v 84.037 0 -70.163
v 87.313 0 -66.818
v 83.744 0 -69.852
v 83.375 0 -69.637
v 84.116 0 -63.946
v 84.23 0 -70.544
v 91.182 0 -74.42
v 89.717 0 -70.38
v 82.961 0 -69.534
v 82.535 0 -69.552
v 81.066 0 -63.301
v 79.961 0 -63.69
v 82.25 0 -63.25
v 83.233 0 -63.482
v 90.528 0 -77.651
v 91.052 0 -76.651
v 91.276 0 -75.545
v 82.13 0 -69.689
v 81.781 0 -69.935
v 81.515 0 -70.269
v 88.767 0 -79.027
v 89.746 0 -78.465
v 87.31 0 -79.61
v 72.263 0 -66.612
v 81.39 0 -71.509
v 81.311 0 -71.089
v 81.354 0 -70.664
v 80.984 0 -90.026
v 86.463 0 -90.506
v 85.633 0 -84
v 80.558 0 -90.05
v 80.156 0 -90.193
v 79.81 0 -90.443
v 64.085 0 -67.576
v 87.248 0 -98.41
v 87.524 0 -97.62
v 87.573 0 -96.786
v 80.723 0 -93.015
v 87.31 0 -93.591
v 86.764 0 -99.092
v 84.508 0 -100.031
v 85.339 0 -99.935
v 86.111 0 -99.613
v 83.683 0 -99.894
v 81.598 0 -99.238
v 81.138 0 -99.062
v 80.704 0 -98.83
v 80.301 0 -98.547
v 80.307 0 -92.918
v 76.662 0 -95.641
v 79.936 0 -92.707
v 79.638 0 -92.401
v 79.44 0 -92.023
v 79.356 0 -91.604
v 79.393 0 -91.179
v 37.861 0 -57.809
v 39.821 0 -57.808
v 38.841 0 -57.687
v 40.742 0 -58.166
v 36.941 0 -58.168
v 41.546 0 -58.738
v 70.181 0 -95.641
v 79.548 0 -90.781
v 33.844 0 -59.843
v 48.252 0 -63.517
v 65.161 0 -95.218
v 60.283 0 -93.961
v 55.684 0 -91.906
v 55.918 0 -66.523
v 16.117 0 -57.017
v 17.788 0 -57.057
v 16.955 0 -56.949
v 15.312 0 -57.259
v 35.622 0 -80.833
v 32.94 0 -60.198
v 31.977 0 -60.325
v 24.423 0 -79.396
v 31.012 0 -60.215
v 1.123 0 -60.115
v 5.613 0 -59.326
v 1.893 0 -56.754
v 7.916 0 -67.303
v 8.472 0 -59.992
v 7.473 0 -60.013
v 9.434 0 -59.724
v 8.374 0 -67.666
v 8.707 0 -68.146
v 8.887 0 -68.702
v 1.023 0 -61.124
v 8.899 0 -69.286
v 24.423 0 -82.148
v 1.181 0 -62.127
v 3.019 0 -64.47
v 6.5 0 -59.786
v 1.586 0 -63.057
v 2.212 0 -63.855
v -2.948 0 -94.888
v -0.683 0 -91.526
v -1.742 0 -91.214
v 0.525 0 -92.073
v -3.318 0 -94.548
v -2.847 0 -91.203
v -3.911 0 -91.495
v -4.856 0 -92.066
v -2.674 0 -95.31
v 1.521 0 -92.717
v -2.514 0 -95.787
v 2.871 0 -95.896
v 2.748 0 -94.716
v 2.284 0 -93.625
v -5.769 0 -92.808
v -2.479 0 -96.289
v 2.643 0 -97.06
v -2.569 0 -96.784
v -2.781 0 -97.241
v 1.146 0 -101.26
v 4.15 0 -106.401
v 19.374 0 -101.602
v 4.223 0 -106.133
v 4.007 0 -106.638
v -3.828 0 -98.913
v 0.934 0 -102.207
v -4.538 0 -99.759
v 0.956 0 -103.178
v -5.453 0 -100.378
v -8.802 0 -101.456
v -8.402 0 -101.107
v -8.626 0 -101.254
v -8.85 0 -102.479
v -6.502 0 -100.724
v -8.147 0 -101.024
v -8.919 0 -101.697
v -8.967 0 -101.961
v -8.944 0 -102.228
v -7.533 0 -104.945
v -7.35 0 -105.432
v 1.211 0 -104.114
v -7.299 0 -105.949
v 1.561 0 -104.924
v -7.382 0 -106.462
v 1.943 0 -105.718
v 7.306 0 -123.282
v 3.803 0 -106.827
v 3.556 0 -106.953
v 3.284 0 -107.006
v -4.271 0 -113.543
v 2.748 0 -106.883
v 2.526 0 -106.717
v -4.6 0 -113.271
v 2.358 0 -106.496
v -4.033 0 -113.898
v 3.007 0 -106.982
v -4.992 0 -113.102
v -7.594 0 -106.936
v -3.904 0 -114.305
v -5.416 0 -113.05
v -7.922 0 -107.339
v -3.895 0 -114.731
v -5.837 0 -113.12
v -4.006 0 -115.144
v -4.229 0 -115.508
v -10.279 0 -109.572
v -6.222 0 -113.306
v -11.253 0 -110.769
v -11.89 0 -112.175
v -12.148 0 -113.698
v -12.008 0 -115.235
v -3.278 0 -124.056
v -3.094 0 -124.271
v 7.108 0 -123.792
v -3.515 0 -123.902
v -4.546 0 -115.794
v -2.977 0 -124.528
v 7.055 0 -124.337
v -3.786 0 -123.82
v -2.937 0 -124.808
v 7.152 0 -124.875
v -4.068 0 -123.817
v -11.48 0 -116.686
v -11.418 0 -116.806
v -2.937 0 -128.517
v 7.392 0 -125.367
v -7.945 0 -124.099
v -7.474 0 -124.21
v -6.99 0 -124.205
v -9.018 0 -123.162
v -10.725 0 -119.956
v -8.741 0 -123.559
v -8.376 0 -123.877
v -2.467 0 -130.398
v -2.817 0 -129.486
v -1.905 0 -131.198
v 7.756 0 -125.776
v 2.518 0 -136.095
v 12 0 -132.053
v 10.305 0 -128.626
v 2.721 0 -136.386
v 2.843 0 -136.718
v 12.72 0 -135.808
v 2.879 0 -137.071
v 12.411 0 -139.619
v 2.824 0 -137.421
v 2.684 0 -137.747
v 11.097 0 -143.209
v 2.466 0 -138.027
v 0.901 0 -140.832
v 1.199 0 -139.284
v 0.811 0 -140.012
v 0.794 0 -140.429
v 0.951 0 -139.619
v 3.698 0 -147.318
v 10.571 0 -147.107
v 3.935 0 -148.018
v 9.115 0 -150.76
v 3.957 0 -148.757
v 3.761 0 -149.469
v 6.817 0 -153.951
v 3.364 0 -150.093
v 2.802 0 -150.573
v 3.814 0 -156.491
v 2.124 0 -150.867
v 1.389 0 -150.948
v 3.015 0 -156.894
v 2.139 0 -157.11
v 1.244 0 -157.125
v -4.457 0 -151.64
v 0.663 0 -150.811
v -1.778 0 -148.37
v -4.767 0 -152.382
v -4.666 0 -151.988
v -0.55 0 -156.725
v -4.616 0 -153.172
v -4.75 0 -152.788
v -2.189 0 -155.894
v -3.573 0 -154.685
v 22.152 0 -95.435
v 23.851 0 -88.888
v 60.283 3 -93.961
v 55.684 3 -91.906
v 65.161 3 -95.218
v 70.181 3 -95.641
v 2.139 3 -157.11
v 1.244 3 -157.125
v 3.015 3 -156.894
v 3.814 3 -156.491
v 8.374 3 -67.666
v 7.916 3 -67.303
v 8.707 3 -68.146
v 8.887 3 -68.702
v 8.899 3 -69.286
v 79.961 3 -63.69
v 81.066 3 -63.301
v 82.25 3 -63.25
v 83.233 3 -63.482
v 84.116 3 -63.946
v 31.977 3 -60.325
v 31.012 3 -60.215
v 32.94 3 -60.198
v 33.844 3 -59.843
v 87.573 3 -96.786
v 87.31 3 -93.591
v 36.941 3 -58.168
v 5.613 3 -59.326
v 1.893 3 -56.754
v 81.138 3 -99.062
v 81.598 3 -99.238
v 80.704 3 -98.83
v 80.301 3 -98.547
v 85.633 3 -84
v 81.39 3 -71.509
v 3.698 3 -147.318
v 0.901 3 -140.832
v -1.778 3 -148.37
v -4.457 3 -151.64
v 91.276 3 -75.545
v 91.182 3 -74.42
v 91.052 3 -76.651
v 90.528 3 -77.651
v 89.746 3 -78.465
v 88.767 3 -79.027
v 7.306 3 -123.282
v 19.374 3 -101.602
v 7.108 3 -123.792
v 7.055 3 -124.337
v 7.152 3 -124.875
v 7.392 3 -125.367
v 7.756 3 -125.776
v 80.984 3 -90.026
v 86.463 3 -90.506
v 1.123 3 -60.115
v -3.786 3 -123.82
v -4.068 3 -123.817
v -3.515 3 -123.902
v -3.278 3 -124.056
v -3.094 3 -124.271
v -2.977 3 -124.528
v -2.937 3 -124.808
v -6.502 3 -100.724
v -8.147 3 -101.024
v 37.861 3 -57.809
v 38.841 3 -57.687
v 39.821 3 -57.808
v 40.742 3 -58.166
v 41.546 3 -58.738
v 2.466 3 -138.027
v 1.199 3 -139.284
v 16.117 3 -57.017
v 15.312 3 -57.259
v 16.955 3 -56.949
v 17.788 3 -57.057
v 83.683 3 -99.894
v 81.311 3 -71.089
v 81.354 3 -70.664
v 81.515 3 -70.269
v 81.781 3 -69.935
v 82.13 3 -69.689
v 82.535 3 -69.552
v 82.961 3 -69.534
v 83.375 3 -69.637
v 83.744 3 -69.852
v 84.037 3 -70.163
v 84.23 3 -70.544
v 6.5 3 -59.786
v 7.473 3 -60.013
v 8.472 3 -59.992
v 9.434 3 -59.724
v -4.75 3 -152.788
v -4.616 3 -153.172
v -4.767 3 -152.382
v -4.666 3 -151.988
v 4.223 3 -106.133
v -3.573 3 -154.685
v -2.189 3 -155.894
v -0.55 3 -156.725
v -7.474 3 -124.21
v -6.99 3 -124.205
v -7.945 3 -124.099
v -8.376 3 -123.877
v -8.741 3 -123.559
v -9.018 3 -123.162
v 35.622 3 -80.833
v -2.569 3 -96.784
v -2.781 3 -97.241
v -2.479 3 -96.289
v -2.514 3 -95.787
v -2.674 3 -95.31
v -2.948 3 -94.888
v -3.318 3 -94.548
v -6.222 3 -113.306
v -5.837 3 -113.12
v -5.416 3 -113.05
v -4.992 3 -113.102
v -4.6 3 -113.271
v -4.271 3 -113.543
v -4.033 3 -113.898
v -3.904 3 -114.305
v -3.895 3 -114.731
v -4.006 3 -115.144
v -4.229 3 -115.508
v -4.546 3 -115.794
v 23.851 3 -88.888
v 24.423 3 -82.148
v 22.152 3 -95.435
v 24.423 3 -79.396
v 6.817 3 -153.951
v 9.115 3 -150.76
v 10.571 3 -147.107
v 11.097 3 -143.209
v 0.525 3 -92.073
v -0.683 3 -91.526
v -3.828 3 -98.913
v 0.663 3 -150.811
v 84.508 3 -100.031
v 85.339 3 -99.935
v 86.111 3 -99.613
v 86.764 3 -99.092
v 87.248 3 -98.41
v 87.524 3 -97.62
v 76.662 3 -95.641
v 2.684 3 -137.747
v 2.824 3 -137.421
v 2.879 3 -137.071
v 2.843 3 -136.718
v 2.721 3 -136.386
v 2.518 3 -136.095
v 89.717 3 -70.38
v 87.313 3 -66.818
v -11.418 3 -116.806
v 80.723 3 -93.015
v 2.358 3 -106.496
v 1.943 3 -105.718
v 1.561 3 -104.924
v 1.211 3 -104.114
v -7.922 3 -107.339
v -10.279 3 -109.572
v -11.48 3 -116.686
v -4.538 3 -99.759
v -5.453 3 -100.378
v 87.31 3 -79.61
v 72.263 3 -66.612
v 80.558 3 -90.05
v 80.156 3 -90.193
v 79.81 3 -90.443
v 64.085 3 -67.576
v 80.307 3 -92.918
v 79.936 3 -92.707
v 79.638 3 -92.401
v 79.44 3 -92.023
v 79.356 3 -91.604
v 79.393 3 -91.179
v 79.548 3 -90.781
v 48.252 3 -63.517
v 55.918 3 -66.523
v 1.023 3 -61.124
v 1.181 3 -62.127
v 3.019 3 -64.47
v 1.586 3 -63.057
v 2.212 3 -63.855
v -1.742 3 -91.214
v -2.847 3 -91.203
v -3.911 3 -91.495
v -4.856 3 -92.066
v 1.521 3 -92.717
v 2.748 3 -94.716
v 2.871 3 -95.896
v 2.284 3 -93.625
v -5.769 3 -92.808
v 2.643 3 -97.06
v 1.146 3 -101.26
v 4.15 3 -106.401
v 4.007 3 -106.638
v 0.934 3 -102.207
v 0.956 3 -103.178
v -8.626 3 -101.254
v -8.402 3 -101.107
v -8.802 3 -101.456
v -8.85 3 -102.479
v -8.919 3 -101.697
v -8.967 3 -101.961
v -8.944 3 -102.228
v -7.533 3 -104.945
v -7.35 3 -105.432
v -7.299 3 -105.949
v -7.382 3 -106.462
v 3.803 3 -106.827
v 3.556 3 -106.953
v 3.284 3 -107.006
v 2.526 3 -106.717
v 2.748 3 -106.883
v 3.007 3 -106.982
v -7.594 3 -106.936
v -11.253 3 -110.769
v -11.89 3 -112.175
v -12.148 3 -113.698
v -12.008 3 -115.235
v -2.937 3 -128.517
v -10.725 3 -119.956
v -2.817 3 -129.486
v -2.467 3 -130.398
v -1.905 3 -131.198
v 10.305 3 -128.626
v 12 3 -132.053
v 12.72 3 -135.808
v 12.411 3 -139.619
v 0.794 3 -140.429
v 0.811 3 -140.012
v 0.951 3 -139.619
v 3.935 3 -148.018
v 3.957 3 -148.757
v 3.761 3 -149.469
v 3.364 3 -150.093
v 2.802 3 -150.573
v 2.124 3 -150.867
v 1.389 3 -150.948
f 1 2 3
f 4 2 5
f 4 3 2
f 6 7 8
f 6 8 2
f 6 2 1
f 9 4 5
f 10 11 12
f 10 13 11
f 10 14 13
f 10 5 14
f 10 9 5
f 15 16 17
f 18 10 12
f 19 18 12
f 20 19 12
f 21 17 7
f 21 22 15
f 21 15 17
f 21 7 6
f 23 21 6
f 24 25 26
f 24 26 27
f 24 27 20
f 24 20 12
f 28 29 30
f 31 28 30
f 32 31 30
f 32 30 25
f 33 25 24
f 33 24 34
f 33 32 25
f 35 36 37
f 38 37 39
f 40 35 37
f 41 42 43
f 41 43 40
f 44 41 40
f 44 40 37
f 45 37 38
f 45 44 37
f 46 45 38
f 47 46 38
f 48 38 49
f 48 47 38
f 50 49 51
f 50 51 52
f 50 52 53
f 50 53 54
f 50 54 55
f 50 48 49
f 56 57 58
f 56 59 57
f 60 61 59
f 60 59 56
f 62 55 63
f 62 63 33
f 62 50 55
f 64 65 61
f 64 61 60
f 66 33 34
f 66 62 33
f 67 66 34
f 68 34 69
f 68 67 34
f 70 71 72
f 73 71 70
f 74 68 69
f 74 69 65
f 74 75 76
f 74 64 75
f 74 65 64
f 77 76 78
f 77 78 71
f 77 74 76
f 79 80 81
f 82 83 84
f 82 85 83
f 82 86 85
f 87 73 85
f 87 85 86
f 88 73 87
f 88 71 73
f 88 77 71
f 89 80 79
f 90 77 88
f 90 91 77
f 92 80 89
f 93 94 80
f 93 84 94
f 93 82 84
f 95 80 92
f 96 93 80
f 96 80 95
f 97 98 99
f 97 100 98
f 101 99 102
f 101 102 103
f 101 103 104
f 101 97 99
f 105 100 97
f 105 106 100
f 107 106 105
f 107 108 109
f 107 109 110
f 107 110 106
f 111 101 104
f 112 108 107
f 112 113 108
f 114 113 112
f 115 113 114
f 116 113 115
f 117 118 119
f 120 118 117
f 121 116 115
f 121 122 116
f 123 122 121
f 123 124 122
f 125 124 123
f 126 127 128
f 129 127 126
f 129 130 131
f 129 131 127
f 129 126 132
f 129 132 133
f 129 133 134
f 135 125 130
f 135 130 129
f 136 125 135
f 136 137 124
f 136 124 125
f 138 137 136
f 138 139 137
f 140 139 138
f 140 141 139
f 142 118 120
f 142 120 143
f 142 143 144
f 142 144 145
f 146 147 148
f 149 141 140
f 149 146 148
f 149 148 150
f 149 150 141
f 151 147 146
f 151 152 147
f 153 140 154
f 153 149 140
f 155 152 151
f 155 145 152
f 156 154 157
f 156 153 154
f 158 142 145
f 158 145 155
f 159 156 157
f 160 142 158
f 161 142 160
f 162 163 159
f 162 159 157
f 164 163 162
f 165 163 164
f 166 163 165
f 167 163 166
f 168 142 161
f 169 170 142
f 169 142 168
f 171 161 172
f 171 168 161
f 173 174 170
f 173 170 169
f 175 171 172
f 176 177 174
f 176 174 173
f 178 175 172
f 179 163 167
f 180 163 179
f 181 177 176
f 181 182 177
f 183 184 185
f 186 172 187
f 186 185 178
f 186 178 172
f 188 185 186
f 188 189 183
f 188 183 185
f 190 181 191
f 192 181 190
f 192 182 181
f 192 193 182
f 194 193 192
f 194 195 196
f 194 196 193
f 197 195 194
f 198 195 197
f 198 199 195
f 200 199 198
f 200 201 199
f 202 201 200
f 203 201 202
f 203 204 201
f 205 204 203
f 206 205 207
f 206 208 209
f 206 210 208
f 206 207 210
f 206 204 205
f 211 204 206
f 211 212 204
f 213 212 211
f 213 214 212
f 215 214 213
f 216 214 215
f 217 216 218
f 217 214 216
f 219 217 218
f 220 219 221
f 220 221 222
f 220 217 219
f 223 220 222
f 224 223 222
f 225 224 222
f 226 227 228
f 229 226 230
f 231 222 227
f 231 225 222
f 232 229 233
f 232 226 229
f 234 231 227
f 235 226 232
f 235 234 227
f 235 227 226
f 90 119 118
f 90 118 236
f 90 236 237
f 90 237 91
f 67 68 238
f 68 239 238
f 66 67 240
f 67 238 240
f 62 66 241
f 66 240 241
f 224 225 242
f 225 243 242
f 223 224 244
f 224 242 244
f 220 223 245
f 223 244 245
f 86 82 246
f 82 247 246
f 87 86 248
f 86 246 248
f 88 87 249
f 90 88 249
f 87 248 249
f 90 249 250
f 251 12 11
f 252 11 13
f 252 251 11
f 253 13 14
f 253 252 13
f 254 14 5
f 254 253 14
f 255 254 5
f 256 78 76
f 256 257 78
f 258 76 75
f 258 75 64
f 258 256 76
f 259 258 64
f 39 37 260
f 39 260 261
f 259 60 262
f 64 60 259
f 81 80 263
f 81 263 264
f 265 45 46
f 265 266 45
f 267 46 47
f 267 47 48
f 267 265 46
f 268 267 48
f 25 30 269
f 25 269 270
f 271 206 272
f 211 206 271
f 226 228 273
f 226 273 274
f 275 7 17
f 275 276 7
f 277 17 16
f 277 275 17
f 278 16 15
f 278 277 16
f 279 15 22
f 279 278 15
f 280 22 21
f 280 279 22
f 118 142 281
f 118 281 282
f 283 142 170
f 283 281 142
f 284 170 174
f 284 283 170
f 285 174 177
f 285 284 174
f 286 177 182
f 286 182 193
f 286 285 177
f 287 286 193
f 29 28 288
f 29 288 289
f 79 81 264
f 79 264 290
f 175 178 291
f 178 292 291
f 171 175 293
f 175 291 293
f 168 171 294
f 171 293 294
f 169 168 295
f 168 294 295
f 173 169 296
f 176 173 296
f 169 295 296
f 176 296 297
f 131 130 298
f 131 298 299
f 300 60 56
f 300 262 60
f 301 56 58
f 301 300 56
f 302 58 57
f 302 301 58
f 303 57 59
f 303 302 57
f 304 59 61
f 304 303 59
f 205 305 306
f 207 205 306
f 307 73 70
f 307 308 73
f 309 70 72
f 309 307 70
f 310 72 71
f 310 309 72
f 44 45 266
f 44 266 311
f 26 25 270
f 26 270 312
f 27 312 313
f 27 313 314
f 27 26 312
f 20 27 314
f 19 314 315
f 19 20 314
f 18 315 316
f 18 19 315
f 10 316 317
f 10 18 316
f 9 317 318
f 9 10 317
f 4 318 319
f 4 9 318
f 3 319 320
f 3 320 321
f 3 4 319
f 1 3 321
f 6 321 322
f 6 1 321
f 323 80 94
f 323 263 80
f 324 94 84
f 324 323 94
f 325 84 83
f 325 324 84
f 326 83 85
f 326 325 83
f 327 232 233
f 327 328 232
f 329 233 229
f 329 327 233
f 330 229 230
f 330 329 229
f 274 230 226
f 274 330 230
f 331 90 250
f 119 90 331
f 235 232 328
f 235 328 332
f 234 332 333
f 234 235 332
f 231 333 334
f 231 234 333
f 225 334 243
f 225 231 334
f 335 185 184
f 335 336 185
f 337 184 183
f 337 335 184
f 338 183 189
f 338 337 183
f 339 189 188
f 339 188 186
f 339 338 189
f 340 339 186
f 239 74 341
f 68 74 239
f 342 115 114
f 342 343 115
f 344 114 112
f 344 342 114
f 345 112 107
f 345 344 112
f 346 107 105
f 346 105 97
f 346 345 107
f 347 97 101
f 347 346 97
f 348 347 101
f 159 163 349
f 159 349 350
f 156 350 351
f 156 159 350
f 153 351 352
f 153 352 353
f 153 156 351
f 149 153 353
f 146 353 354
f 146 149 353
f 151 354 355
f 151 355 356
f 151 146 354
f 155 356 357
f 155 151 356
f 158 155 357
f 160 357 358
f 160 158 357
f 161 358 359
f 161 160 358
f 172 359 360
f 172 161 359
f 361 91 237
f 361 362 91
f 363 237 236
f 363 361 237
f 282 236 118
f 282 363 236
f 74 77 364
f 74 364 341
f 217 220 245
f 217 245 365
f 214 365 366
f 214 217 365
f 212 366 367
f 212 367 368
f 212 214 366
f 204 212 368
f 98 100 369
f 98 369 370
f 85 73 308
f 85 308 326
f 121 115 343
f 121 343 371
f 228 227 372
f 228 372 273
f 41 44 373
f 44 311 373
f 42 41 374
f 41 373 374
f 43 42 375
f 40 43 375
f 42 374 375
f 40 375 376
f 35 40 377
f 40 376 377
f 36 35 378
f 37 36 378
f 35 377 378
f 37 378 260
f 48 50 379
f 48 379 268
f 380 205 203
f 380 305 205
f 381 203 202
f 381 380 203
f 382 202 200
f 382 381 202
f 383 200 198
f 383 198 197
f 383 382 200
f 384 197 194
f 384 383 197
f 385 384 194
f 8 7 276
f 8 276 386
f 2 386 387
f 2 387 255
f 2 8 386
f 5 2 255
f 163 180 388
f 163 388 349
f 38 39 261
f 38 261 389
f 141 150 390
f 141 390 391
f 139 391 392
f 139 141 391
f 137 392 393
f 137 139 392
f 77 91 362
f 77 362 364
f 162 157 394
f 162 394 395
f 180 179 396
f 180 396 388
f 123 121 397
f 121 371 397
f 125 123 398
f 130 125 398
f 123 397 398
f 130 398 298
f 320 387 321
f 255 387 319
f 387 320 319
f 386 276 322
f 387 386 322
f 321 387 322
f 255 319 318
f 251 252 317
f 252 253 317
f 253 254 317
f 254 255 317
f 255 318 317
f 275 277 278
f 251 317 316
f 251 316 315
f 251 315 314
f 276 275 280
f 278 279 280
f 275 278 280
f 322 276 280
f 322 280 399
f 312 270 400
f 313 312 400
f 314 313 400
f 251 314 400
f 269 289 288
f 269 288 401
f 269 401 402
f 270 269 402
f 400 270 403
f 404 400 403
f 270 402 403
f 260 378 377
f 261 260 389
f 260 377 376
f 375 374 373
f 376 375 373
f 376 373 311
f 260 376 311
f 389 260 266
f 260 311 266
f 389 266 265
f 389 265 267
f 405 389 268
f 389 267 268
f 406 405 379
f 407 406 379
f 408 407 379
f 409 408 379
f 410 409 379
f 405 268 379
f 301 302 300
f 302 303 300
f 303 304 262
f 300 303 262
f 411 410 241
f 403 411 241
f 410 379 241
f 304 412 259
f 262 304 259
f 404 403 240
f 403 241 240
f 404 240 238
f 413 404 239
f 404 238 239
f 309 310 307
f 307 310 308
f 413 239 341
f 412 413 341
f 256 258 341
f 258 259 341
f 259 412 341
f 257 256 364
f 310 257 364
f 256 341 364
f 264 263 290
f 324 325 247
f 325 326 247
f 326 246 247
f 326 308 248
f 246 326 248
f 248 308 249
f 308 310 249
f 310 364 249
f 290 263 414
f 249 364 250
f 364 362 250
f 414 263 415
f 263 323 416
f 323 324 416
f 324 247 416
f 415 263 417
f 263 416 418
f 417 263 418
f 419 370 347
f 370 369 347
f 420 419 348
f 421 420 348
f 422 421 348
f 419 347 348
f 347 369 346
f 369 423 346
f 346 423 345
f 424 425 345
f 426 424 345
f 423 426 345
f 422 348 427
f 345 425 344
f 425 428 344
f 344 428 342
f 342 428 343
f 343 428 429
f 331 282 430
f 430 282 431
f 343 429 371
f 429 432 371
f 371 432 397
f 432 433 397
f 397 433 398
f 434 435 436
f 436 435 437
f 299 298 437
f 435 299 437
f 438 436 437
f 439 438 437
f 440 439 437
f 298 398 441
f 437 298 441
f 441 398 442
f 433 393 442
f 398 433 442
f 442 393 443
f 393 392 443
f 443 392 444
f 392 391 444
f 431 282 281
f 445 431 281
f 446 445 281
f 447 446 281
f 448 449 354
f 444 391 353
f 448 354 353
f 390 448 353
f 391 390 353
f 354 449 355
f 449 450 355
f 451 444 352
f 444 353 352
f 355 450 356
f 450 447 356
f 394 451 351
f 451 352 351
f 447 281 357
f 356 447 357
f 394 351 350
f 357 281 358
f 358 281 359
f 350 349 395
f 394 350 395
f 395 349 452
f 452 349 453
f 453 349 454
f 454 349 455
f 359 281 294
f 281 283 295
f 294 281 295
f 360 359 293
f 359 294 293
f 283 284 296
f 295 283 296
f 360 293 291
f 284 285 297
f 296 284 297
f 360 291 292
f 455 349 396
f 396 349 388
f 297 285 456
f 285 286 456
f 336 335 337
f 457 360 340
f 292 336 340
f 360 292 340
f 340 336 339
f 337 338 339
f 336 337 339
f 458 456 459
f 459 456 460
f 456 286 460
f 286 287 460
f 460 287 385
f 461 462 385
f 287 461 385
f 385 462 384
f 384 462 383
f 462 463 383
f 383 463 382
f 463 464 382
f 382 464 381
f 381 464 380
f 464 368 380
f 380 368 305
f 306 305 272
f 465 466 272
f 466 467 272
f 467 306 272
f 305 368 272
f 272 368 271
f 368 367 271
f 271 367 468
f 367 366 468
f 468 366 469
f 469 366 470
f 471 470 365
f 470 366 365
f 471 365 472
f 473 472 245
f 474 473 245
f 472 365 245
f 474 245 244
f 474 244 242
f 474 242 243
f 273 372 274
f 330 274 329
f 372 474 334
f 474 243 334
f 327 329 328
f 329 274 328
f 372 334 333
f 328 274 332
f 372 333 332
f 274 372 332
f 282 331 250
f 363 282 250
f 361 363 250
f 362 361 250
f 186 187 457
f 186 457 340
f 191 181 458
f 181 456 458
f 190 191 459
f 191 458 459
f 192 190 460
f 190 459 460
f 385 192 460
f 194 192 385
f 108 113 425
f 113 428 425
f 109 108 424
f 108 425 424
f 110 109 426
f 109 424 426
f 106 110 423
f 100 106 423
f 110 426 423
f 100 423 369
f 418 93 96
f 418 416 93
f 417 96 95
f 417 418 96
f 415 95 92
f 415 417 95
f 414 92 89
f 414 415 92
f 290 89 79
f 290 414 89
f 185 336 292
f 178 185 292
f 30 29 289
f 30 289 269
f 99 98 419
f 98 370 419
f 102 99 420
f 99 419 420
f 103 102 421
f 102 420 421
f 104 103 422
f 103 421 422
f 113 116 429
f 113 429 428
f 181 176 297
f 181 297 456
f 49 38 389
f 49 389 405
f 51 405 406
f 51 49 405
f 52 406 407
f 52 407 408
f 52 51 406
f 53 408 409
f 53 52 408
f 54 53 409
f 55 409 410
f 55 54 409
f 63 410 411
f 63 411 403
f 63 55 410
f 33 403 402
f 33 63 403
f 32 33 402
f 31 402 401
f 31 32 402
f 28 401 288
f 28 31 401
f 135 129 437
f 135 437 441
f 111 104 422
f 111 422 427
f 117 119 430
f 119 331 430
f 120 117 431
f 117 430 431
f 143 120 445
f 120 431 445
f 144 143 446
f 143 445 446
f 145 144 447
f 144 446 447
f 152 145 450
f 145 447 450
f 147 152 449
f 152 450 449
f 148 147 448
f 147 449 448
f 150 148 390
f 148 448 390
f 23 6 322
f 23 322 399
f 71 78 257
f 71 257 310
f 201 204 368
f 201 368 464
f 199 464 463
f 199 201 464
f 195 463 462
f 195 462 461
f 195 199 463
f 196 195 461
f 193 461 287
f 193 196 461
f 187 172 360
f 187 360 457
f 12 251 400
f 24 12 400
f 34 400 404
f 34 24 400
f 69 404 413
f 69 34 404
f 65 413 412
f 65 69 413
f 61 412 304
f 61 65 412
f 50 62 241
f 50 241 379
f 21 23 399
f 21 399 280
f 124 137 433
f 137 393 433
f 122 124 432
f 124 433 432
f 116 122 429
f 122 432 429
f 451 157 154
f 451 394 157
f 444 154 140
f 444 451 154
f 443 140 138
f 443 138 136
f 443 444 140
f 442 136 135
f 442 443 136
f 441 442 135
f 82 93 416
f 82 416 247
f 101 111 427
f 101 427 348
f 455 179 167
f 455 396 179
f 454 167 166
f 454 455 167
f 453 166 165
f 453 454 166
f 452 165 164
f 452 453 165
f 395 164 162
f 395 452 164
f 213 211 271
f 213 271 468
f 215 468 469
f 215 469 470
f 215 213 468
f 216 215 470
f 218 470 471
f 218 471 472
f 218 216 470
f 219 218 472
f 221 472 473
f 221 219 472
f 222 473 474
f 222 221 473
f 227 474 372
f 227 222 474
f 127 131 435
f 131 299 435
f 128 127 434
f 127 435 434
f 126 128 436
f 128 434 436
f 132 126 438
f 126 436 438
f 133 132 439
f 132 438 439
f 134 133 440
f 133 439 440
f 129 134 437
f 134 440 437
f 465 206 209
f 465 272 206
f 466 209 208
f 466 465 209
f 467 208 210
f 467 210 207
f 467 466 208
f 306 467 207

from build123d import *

# Parameters (mm, degrees)
BOSS_EXTRUDE2_DEPTH = 3
FILLET1_R           = 1
FILLET2_R           = 4
FILLET3_R           = 40
FILLET4_R           = 2
FILLET5_R           = 1.4
FILLET6_R           = 30
FILLET7_R           = 3
FILLET8_R           = 6


with BuildPart() as part:
    # Sketch4 → Boss-Extrude2 (new body)
    with BuildSketch(Plane(origin=(0, 0, 0), x_dir=(1, 0, 0), z_dir=(0, 1, 0))):
        with BuildLine():
            Line((87.31, 79.61), (91.618486592, 77.887634392))
            ThreePointArc((91.618486592, 77.887634392), (88.863922918, 68.889748023), (81.855760182, 62.61))
            ThreePointArc((81.855760182, 62.61), (59.656820918, 67.258748235), (39.555721251, 56.754008505))
            Line((39.555721251, 56.754008505), (32.499176634, 60.570465889))
            Line((32.499176634, 60.570465889), (16.517315238, 56.754008505))
            Line((16.517315238, 56.754008505), (7.414760931, 60.570465889))
            Line((7.414760931, 60.570465889), (1.892511031, 56.754008505))
            Line((1.892511031, 56.754008505), (0.46321022, 62.992365596))
            Line((0.46321022, 62.992365596), (9.066007765, 67.967785451))
            Line((9.066007765, 67.967785451), (3.879350061, 108.84040305))
            ThreePointArc((3.879350061, 108.84040305), (2.01611376, 105.85998951), (0.66321022, 102.615892348))
            Line((0.66321022, 102.615892348), (3.879350061, 93.591357519))
            Line((3.879350061, 93.591357519), (-2.93678978, 90.505813501))
            Line((-2.93678978, 90.505813501), (-5.768910997, 92.808331559))
            Line((-5.768910997, 92.808331559), (-1.778138145, 95.640627614))
            Line((-1.778138145, 95.640627614), (-4.765318246, 100.408264948))
            Line((-4.765318246, 100.408264948), (-9.496065378, 101.269350579))
            Line((-9.496065378, 101.269350579), (-6.815233616, 106.290541956))
            Line((-6.815233616, 106.290541956), (-13.555482626, 112.676963609))
            Line((-13.555482626, 112.676963609), (-11.418327461, 116.805813501))
            Line((-11.418327461, 116.805813501), (-6.221647651, 113.305813501))
            ThreePointArc((-6.221647651, 113.305813501), (-4.139581192, 113.712014511), (-4.545782202, 115.79408097))
            Line((-4.545782202, 115.79408097), (-10.724979751, 119.955813501))
            Line((-10.724979751, 119.955813501), (-8.365992616, 124.387469749))
            Line((-8.365992616, 124.387469749), (-2.93678978, 123.666991194))
            Line((-2.93678978, 123.666991194), (-2.93678978, 130.055848545))
            Line((-2.93678978, 130.055848545), (3.413077147, 137.08559026))
            Line((3.413077147, 137.08559026), (0.522809133, 139.95641446))
            Line((0.522809133, 139.95641446), (3.698074275, 147.318161123))
            ThreePointArc((3.698074275, 147.318161123), (3.364070449, 150.092913281), (0.66321022, 150.811357519))
            Line((0.66321022, 150.811357519), (-1.778138145, 148.370009154))
            Line((-1.778138145, 148.370009154), (-4.999762187, 152.301948586))
            ThreePointArc((-4.999762187, 152.301948586), (-1.941119995, 156.054428227), (2.78321022, 157.111357519))
            ThreePointArc((2.78321022, 157.111357519), (8.815996079, 151.282158066), (11.096791577, 143.209237691))
            ThreePointArc((11.096791577, 143.209237691), (12.311774437, 133.113784868), (6.46321022, 124.795813501))
            Line((6.46321022, 124.795813501), (24.42321022, 92.530161433))
            Line((24.42321022, 92.530161433), (24.42321022, 79.395813501))
            Line((24.42321022, 79.395813501), (35.622369927, 80.833234121))
            Line((35.622369927, 80.833234121), (62.451437904, 95.640627614))
            Line((62.451437904, 95.640627614), (76.661791259, 95.640627614))
            Line((76.661791259, 95.640627614), (80.884676882, 99.013707758))
            Line((80.884676882, 99.013707758), (87.938365698, 101.231357519))
            Line((87.938365698, 101.231357519), (87.31, 93.591357519))
            Line((87.31, 93.591357519), (80.722672152, 93.01504101))
            ThreePointArc((80.722672152, 93.01504101), (79.359113719, 91.390015348), (80.984139381, 90.026456915))
            Line((80.984139381, 90.026456915), (86.46321022, 90.505813501))
            Line((86.46321022, 90.505813501), (85.632866314, 84))
            Line((85.632866314, 84), (81.389705108, 71.508585308))
            ThreePointArc((81.389705108, 71.508585308), (82.327545423, 69.605835839), (84.230294892, 70.543676154))
            Line((84.230294892, 70.543676154), (87.31, 79.61))
        make_face()
    extrude(amount=BOSS_EXTRUDE2_DEPTH)

    # Fillet1
    fillet1_edges = [part.edges().sort_by_distance(p)[0] for p in [
        (3.879350061, 1.5, -108.84040305),
        (-9.496065378, 1.5, -101.269350579),
        (-2.93678978, 1.5, -123.666991194),
    ]]
    fillet(fillet1_edges, radius=FILLET1_R)

    # Fillet2
    fillet2_edges = [part.edges().sort_by_distance(p)[0] for p in [
        (39.555721251, 1.5, -56.754008505),
        (32.499176634, 1.5, -60.570465889),
        (16.517315238, 1.5, -56.754008505),
        (7.414760931, 1.5, -60.570465889),
        (0.46321022, 1.5, -62.992365596),
        (0.66321022, 1.5, -102.615892348),
        (3.879350061, 1.5, -93.591357519),
        (-2.93678978, 1.5, -90.505813501),
        (-4.765318246, 1.5, -100.408264948),
        (-2.93678978, 1.5, -130.055848545),
        (2.78321022, 1.5, -157.111357519),
        (80.884676882, 1.5, -99.013707758),
        (91.618486592, 1.5, -77.887634392),
        (81.855760182, 1.5, -62.61),
    ]]
    fillet(fillet2_edges, radius=FILLET2_R)

    # Fillet3
    fillet3_edges = [part.edges().sort_by_distance(p)[0] for p in [
        (24.42321022, 1.5, -92.530161433),
    ]]
    fillet(fillet3_edges, radius=FILLET3_R)

    # Fillet4
    fillet4_edges = [part.edges().sort_by_distance(p)[0] for p in [
        (9.066007765, 1.5, -67.967785451),
        (-1.778138145, 1.5, -95.640627614),
        (-6.815233616, 1.5, -106.290541956),
        (-8.365992616, 1.5, -124.387469749),
        (6.46321022, 1.5, -124.795813501),
    ]]
    fillet(fillet4_edges, radius=FILLET4_R)

    # Fillet5
    fillet5_edges = [part.edges().sort_by_distance(p)[0] for p in [
        (3.413077147, 1.5, -137.08559026),
        (0.522809133, 1.5, -139.95641446),
        (-4.999762187, 1.5, -152.301948586),
    ]]
    fillet(fillet5_edges, radius=FILLET5_R)

    # Fillet6
    fillet6_edges = [part.edges().sort_by_distance(p)[0] for p in [
        (62.451437904, 1.5, -95.640627614),
    ]]
    fillet(fillet6_edges, radius=FILLET6_R)

    # Fillet7
    fillet7_edges = [part.edges().sort_by_distance(p)[0] for p in [
        (87.938365698, 1.5, -101.231357519),
    ]]
    fillet(fillet7_edges, radius=FILLET7_R)

    # Fillet8
    fillet8_edges = [part.edges().sort_by_distance(p)[0] for p in [
        (-13.555482626, 1.5, -112.676963609),
    ]]
    fillet(fillet8_edges, radius=FILLET8_R)


solid = part.part
